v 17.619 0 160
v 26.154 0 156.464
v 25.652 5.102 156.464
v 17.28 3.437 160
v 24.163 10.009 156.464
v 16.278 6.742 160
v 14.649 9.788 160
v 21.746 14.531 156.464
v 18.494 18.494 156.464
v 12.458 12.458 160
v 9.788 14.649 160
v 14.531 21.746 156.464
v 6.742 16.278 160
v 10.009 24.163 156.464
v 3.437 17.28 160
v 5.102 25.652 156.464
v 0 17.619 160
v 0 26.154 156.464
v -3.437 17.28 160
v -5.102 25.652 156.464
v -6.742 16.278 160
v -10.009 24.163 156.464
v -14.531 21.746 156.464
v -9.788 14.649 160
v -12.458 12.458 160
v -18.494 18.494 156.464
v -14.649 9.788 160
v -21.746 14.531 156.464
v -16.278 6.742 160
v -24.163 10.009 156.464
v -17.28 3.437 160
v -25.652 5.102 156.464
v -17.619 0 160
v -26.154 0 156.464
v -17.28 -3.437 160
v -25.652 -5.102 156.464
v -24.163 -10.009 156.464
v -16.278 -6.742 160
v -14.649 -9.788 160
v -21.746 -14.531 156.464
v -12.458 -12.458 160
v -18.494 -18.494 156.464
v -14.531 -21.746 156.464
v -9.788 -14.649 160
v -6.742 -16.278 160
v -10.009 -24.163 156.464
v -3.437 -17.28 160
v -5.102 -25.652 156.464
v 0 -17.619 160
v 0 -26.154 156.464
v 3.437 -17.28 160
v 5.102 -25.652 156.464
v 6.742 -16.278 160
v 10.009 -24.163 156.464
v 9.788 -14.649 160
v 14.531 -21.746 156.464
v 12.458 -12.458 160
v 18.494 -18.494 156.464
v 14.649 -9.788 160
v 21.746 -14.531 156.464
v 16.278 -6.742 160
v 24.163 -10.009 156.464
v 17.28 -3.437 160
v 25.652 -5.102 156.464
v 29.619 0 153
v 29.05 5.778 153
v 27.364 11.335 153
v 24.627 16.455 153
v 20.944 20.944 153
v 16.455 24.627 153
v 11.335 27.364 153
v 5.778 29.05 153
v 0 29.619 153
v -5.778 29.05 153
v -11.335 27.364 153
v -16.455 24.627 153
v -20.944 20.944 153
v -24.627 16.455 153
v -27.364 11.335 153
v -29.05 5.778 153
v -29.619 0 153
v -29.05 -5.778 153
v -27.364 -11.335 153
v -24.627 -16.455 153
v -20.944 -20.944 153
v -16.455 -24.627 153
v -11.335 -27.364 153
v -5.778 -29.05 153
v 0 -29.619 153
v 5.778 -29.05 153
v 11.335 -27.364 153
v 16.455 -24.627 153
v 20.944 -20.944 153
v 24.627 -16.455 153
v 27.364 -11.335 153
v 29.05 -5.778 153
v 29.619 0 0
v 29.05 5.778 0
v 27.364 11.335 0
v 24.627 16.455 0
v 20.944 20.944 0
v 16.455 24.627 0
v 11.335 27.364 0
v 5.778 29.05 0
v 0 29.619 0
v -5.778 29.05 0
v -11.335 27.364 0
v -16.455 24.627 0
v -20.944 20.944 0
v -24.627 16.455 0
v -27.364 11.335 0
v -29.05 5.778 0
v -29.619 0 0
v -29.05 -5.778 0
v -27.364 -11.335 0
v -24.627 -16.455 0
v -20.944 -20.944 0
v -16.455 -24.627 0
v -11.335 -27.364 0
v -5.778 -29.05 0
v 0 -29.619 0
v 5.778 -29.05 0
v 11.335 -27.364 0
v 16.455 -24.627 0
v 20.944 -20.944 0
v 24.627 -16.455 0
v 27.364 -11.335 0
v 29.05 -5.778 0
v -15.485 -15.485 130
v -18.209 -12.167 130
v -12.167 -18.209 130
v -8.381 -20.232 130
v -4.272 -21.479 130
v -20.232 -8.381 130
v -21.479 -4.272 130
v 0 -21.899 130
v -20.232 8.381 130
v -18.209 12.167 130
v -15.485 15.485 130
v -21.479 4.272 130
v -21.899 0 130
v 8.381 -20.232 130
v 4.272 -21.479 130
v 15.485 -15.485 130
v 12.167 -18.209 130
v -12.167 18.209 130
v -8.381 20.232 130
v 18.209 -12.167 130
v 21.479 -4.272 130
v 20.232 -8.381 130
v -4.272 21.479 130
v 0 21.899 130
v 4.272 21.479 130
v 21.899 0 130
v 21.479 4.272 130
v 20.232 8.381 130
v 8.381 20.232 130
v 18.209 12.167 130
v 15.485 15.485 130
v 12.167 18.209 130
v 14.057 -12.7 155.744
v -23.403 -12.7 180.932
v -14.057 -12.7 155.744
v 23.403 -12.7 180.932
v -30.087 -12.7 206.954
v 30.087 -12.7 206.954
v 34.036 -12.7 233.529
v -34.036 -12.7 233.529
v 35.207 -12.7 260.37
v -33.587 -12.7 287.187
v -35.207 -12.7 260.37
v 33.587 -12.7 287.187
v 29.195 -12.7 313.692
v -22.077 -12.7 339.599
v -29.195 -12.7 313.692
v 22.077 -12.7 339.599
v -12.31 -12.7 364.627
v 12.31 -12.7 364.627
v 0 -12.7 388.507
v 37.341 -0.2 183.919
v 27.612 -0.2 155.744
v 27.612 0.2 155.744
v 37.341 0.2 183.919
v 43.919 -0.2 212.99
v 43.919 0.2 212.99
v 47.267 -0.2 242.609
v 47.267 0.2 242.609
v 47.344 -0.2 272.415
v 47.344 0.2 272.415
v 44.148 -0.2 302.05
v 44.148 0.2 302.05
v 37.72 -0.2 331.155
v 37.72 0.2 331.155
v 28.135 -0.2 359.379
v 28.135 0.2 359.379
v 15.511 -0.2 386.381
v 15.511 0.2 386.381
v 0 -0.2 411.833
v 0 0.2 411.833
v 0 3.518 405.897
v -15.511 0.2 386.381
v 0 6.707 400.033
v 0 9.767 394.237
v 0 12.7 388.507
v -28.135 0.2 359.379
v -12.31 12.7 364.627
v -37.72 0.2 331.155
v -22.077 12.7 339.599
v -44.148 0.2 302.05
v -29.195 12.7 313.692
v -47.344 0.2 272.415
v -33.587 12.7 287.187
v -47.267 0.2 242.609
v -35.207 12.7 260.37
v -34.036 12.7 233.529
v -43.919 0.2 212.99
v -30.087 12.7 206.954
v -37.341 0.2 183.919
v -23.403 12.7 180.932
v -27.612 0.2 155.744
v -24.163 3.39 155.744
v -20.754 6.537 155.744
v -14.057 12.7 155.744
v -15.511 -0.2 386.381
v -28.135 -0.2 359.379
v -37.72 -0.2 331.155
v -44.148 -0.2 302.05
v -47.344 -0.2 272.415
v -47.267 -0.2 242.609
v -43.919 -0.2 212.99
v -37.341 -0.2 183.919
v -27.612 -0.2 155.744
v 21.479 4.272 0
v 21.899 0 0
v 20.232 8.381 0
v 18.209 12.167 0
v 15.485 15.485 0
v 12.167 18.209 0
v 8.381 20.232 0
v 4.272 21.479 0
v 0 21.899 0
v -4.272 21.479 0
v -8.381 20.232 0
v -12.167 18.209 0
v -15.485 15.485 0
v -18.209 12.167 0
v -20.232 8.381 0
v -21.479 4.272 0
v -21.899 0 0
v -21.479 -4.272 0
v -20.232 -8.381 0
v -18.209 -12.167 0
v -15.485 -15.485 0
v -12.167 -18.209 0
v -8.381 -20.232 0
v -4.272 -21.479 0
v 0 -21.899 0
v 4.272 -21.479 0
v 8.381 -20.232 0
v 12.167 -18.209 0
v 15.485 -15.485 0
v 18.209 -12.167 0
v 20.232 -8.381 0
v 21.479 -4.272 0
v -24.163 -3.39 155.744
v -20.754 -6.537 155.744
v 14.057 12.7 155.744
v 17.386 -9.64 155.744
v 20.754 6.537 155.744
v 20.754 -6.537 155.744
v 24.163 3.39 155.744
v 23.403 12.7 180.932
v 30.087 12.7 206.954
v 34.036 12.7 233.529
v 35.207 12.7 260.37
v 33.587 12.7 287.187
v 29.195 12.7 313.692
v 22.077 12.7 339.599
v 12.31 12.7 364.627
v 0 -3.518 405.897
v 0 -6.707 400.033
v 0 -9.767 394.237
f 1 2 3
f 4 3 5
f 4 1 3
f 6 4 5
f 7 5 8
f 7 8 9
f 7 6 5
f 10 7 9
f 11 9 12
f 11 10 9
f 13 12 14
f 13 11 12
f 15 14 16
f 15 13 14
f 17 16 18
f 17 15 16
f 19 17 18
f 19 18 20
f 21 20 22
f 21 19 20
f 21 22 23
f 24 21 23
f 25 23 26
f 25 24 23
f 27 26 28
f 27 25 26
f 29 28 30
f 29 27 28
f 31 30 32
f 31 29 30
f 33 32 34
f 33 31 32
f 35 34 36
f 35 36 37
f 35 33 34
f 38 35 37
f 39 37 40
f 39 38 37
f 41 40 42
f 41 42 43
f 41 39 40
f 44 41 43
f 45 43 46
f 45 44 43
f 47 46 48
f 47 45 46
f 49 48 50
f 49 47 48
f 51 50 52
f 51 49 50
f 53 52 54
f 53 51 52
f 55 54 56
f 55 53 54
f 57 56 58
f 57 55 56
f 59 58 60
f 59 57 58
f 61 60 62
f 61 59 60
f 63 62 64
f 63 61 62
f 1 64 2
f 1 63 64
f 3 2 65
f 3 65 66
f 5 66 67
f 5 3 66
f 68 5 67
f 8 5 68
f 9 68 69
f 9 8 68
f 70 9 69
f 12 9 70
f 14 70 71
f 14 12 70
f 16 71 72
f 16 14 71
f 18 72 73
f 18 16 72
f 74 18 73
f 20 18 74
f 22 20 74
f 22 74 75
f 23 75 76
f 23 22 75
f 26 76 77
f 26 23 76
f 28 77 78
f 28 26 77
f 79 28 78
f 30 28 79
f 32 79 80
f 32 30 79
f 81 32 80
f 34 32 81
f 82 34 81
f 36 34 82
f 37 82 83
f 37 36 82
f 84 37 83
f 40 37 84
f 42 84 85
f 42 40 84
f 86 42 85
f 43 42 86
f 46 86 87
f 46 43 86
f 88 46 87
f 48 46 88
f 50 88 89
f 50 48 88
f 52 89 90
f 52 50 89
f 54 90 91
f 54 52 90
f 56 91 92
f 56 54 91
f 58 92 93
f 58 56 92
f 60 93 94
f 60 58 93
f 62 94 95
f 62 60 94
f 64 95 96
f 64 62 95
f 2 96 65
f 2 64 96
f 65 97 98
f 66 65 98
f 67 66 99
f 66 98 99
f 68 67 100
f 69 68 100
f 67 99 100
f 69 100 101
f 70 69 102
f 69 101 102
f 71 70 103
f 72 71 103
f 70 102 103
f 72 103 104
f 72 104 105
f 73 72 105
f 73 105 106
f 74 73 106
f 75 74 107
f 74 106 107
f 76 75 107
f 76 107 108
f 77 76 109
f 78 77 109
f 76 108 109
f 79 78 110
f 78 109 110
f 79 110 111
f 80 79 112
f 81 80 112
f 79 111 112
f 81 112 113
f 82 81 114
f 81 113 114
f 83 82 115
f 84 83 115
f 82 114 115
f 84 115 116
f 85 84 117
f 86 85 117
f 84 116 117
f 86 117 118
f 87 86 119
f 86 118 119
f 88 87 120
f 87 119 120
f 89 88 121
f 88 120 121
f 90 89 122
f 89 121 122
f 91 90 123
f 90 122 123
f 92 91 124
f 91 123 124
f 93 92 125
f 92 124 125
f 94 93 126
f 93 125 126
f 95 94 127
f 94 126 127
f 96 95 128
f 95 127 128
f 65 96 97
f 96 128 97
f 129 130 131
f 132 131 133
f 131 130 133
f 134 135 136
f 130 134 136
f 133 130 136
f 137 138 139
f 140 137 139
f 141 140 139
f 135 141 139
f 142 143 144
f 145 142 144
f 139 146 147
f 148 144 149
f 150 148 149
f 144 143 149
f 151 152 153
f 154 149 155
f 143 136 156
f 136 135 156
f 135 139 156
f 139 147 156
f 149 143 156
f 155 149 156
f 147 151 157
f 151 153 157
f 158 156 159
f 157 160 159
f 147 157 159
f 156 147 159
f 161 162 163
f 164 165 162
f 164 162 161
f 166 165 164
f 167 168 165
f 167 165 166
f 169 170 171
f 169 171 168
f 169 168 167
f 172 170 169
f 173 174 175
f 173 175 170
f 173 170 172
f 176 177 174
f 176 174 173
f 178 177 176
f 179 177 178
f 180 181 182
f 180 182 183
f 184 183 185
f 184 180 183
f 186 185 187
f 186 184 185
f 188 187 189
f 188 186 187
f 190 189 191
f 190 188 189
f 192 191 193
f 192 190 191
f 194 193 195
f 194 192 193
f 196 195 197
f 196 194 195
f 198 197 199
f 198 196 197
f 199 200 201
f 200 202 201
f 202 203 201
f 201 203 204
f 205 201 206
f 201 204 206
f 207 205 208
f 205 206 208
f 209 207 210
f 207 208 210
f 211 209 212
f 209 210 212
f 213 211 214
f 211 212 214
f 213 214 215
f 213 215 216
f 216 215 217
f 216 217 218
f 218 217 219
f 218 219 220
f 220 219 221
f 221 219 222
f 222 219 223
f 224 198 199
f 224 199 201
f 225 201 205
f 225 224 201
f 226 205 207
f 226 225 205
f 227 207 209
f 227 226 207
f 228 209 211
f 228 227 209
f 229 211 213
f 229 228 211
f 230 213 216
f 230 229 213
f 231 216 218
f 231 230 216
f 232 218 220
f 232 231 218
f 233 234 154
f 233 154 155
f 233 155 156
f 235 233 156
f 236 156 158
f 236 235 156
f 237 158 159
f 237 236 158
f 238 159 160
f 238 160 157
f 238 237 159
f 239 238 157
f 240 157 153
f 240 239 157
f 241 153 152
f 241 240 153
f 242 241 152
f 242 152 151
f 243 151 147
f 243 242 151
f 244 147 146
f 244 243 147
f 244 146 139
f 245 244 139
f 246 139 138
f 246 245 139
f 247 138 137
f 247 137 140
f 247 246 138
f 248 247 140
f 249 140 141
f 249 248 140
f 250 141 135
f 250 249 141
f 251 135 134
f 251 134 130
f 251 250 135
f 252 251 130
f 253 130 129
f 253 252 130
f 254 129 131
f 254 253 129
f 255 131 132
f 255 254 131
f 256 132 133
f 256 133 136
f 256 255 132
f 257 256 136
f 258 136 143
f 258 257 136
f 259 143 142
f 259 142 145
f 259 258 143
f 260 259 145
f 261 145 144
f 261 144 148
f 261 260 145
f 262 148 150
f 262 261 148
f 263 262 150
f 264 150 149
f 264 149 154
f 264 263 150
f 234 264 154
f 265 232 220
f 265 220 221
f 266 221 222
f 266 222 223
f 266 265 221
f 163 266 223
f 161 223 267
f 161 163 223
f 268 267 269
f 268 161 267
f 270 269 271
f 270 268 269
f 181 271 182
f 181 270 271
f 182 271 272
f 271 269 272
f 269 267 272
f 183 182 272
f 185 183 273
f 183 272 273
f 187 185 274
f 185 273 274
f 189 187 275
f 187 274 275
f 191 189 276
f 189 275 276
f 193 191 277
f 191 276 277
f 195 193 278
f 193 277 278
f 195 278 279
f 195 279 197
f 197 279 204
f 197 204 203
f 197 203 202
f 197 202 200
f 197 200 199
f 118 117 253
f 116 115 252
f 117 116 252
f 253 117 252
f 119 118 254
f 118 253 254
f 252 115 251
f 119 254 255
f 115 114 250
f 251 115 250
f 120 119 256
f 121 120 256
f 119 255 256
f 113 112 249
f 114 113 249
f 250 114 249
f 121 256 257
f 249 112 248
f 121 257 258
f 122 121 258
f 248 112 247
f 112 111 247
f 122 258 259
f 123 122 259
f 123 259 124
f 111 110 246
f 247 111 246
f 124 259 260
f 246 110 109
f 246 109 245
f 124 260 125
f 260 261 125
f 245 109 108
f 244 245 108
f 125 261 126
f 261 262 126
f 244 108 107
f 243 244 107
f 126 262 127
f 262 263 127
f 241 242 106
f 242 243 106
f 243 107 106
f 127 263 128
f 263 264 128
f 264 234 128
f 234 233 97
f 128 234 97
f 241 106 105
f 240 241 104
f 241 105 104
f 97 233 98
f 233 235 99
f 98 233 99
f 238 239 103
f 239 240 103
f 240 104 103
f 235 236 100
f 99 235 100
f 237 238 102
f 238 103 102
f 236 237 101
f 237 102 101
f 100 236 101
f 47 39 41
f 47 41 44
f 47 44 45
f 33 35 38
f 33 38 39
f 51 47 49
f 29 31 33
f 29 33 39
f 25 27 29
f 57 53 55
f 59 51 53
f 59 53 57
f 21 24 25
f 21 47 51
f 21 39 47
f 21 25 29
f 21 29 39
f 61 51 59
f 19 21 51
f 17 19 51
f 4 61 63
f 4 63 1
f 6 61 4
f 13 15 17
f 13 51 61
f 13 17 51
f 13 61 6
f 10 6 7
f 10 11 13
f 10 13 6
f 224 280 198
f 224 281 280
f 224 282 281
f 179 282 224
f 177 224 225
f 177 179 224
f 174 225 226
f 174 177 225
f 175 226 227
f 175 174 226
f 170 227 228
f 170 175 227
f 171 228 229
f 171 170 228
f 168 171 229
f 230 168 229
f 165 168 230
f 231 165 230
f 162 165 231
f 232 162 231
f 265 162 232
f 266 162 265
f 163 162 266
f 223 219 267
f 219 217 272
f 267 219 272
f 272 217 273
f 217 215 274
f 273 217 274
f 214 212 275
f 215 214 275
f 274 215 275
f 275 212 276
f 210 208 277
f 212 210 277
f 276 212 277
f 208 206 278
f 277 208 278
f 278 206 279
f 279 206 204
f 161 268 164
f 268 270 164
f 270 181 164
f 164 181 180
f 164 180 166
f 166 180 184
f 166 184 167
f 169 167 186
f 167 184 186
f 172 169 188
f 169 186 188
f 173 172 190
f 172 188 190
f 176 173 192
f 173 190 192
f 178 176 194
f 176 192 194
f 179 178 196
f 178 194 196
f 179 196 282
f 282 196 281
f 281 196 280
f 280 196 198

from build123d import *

# Parameters (mm, degrees)
F8_R     = 29.6187054139
F0_DEPTH = 160
F1_DEPTH = 12.7
F2_SIZE  = 12.5
F4_SIZE  = 7
F5_SIZE  = 5
F6_R     = 21.8994140724
F7_DEPTH = 130


with BuildPart() as f0:
    # F8 (on Top) → F0 (new body)
    with BuildSketch(Plane.XY):
        Circle(F8_R)
    extrude(amount=F0_DEPTH)

    # F4
    f4_edges = [f0.edges().sort_by_distance(p)[0] for p in [
        (-29.618705, 0, 160),
    ]]
    chamfer(f4_edges, length=F4_SIZE)

    # F5
    f5_edges = [f0.edges().sort_by_distance(p)[0] for p in [
        (-22.618705, 0, 160),
    ]]
    chamfer(f5_edges, length=F5_SIZE)

    # F6 (on Top) → F7 (cut)
    with BuildSketch(Plane.XY):
        Circle(F6_R)
    extrude(amount=F7_DEPTH, mode=Mode.SUBTRACT)


with BuildPart() as f1:
    # F9 (on Front) → F1 (new body, symmetric)
    with BuildSketch(Plane.XZ):
        with BuildLine():
            Line((-27.6122391224, 155.7444036007), (27.6122391224, 155.7444036007))
            ThreePointArc((27.6122391224, 155.7444036007), (46.1533501296, 287.276587292), (0, 411.8332266808))
            ThreePointArc((0, 411.8332266808), (-46.1533501296, 287.276587292), (-27.6122391224, 155.7444036007))
        make_face()
    extrude(amount=F1_DEPTH, both=True)

    # F2
    f2_edges = [f1.edges().sort_by_distance(p)[0] for p in [
        (-46.15335, -12.7, 287.276587),
        (46.15335, -12.7, 287.276587),
        (-46.15335, 12.7, 287.276587),
        (46.15335, 12.7, 287.276587),
    ]]
    chamfer(f2_edges, length=F2_SIZE)


solid = Compound([f0.part, f1.part])
